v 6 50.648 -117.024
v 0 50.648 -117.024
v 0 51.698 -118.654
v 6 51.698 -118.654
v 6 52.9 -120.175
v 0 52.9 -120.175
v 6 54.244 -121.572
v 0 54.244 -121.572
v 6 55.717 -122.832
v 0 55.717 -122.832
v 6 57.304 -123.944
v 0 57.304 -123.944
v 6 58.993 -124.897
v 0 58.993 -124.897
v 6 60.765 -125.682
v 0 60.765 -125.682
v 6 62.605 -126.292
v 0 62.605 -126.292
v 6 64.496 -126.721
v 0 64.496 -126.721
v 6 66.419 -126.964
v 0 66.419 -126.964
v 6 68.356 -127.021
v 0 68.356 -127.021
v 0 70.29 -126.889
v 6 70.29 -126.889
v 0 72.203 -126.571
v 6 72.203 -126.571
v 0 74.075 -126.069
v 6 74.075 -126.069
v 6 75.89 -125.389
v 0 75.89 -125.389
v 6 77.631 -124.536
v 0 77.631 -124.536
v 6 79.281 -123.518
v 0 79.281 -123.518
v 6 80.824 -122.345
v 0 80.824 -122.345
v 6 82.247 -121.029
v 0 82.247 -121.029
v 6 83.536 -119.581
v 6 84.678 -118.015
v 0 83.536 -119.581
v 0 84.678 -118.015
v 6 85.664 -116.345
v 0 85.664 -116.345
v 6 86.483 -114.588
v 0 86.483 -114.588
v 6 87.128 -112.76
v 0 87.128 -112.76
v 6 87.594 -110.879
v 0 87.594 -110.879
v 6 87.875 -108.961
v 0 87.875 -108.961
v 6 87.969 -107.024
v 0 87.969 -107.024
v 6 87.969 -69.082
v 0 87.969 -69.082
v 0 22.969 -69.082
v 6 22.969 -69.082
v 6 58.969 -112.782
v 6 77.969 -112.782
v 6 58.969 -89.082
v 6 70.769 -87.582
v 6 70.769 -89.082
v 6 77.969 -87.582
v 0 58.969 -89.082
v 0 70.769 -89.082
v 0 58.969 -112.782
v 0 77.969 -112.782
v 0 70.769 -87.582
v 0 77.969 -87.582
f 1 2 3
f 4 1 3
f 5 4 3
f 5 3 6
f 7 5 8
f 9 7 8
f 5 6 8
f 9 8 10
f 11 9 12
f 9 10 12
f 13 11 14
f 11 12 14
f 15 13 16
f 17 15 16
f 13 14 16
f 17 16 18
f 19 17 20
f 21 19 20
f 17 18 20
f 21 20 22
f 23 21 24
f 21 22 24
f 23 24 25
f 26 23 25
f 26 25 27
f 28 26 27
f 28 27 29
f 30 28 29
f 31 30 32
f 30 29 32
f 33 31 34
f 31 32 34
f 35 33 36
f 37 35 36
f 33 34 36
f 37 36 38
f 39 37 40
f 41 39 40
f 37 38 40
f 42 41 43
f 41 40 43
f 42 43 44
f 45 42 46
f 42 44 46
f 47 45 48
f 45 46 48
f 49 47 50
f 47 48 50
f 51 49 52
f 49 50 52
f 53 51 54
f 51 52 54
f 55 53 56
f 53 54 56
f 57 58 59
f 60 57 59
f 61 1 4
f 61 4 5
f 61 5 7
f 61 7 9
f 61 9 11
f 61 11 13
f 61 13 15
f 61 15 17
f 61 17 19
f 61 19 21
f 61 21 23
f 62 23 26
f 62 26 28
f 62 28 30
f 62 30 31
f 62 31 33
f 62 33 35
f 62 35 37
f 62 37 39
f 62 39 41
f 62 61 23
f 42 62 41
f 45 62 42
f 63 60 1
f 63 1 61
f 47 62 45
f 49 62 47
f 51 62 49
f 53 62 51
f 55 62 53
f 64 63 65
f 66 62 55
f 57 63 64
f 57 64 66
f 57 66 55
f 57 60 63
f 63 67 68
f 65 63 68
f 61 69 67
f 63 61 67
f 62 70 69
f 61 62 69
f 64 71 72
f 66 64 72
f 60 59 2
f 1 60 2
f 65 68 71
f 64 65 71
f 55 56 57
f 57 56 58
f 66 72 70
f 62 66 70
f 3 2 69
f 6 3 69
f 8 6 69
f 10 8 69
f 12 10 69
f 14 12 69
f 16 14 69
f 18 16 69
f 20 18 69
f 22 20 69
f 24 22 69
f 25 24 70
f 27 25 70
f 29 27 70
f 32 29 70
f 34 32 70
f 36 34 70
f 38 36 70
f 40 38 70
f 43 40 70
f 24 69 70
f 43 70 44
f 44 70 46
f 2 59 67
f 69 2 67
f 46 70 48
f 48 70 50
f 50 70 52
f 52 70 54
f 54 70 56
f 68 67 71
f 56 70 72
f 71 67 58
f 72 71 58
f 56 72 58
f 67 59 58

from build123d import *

# Parameters (mm, degrees)
F1_DEPTH = 6


with BuildPart() as f1:
    # F0 (on Right) → F1 (new body)
    with BuildSketch(Plane.YZ):
        with BuildLine():
            Line((87.968563, -69.082131), (22.968563, -69.082131))
            Line((22.968563, -69.082131), (50.648055, -117.024417))
            ThreePointArc((50.648055, -117.024417), (73.144944, -126.342933), (87.968563, -107.024417))
            Line((87.968563, -107.024417), (87.968563, -69.082131))
        make_face()
        Polygon((58.968563, -112.782131), (58.968563, -89.082131), (70.768563, -89.082131), (70.768563, -87.582131), (77.968563, -87.582131), (77.968563, -112.782131), align=None, mode=Mode.SUBTRACT)
    extrude(amount=F1_DEPTH)


solid = f1.part
